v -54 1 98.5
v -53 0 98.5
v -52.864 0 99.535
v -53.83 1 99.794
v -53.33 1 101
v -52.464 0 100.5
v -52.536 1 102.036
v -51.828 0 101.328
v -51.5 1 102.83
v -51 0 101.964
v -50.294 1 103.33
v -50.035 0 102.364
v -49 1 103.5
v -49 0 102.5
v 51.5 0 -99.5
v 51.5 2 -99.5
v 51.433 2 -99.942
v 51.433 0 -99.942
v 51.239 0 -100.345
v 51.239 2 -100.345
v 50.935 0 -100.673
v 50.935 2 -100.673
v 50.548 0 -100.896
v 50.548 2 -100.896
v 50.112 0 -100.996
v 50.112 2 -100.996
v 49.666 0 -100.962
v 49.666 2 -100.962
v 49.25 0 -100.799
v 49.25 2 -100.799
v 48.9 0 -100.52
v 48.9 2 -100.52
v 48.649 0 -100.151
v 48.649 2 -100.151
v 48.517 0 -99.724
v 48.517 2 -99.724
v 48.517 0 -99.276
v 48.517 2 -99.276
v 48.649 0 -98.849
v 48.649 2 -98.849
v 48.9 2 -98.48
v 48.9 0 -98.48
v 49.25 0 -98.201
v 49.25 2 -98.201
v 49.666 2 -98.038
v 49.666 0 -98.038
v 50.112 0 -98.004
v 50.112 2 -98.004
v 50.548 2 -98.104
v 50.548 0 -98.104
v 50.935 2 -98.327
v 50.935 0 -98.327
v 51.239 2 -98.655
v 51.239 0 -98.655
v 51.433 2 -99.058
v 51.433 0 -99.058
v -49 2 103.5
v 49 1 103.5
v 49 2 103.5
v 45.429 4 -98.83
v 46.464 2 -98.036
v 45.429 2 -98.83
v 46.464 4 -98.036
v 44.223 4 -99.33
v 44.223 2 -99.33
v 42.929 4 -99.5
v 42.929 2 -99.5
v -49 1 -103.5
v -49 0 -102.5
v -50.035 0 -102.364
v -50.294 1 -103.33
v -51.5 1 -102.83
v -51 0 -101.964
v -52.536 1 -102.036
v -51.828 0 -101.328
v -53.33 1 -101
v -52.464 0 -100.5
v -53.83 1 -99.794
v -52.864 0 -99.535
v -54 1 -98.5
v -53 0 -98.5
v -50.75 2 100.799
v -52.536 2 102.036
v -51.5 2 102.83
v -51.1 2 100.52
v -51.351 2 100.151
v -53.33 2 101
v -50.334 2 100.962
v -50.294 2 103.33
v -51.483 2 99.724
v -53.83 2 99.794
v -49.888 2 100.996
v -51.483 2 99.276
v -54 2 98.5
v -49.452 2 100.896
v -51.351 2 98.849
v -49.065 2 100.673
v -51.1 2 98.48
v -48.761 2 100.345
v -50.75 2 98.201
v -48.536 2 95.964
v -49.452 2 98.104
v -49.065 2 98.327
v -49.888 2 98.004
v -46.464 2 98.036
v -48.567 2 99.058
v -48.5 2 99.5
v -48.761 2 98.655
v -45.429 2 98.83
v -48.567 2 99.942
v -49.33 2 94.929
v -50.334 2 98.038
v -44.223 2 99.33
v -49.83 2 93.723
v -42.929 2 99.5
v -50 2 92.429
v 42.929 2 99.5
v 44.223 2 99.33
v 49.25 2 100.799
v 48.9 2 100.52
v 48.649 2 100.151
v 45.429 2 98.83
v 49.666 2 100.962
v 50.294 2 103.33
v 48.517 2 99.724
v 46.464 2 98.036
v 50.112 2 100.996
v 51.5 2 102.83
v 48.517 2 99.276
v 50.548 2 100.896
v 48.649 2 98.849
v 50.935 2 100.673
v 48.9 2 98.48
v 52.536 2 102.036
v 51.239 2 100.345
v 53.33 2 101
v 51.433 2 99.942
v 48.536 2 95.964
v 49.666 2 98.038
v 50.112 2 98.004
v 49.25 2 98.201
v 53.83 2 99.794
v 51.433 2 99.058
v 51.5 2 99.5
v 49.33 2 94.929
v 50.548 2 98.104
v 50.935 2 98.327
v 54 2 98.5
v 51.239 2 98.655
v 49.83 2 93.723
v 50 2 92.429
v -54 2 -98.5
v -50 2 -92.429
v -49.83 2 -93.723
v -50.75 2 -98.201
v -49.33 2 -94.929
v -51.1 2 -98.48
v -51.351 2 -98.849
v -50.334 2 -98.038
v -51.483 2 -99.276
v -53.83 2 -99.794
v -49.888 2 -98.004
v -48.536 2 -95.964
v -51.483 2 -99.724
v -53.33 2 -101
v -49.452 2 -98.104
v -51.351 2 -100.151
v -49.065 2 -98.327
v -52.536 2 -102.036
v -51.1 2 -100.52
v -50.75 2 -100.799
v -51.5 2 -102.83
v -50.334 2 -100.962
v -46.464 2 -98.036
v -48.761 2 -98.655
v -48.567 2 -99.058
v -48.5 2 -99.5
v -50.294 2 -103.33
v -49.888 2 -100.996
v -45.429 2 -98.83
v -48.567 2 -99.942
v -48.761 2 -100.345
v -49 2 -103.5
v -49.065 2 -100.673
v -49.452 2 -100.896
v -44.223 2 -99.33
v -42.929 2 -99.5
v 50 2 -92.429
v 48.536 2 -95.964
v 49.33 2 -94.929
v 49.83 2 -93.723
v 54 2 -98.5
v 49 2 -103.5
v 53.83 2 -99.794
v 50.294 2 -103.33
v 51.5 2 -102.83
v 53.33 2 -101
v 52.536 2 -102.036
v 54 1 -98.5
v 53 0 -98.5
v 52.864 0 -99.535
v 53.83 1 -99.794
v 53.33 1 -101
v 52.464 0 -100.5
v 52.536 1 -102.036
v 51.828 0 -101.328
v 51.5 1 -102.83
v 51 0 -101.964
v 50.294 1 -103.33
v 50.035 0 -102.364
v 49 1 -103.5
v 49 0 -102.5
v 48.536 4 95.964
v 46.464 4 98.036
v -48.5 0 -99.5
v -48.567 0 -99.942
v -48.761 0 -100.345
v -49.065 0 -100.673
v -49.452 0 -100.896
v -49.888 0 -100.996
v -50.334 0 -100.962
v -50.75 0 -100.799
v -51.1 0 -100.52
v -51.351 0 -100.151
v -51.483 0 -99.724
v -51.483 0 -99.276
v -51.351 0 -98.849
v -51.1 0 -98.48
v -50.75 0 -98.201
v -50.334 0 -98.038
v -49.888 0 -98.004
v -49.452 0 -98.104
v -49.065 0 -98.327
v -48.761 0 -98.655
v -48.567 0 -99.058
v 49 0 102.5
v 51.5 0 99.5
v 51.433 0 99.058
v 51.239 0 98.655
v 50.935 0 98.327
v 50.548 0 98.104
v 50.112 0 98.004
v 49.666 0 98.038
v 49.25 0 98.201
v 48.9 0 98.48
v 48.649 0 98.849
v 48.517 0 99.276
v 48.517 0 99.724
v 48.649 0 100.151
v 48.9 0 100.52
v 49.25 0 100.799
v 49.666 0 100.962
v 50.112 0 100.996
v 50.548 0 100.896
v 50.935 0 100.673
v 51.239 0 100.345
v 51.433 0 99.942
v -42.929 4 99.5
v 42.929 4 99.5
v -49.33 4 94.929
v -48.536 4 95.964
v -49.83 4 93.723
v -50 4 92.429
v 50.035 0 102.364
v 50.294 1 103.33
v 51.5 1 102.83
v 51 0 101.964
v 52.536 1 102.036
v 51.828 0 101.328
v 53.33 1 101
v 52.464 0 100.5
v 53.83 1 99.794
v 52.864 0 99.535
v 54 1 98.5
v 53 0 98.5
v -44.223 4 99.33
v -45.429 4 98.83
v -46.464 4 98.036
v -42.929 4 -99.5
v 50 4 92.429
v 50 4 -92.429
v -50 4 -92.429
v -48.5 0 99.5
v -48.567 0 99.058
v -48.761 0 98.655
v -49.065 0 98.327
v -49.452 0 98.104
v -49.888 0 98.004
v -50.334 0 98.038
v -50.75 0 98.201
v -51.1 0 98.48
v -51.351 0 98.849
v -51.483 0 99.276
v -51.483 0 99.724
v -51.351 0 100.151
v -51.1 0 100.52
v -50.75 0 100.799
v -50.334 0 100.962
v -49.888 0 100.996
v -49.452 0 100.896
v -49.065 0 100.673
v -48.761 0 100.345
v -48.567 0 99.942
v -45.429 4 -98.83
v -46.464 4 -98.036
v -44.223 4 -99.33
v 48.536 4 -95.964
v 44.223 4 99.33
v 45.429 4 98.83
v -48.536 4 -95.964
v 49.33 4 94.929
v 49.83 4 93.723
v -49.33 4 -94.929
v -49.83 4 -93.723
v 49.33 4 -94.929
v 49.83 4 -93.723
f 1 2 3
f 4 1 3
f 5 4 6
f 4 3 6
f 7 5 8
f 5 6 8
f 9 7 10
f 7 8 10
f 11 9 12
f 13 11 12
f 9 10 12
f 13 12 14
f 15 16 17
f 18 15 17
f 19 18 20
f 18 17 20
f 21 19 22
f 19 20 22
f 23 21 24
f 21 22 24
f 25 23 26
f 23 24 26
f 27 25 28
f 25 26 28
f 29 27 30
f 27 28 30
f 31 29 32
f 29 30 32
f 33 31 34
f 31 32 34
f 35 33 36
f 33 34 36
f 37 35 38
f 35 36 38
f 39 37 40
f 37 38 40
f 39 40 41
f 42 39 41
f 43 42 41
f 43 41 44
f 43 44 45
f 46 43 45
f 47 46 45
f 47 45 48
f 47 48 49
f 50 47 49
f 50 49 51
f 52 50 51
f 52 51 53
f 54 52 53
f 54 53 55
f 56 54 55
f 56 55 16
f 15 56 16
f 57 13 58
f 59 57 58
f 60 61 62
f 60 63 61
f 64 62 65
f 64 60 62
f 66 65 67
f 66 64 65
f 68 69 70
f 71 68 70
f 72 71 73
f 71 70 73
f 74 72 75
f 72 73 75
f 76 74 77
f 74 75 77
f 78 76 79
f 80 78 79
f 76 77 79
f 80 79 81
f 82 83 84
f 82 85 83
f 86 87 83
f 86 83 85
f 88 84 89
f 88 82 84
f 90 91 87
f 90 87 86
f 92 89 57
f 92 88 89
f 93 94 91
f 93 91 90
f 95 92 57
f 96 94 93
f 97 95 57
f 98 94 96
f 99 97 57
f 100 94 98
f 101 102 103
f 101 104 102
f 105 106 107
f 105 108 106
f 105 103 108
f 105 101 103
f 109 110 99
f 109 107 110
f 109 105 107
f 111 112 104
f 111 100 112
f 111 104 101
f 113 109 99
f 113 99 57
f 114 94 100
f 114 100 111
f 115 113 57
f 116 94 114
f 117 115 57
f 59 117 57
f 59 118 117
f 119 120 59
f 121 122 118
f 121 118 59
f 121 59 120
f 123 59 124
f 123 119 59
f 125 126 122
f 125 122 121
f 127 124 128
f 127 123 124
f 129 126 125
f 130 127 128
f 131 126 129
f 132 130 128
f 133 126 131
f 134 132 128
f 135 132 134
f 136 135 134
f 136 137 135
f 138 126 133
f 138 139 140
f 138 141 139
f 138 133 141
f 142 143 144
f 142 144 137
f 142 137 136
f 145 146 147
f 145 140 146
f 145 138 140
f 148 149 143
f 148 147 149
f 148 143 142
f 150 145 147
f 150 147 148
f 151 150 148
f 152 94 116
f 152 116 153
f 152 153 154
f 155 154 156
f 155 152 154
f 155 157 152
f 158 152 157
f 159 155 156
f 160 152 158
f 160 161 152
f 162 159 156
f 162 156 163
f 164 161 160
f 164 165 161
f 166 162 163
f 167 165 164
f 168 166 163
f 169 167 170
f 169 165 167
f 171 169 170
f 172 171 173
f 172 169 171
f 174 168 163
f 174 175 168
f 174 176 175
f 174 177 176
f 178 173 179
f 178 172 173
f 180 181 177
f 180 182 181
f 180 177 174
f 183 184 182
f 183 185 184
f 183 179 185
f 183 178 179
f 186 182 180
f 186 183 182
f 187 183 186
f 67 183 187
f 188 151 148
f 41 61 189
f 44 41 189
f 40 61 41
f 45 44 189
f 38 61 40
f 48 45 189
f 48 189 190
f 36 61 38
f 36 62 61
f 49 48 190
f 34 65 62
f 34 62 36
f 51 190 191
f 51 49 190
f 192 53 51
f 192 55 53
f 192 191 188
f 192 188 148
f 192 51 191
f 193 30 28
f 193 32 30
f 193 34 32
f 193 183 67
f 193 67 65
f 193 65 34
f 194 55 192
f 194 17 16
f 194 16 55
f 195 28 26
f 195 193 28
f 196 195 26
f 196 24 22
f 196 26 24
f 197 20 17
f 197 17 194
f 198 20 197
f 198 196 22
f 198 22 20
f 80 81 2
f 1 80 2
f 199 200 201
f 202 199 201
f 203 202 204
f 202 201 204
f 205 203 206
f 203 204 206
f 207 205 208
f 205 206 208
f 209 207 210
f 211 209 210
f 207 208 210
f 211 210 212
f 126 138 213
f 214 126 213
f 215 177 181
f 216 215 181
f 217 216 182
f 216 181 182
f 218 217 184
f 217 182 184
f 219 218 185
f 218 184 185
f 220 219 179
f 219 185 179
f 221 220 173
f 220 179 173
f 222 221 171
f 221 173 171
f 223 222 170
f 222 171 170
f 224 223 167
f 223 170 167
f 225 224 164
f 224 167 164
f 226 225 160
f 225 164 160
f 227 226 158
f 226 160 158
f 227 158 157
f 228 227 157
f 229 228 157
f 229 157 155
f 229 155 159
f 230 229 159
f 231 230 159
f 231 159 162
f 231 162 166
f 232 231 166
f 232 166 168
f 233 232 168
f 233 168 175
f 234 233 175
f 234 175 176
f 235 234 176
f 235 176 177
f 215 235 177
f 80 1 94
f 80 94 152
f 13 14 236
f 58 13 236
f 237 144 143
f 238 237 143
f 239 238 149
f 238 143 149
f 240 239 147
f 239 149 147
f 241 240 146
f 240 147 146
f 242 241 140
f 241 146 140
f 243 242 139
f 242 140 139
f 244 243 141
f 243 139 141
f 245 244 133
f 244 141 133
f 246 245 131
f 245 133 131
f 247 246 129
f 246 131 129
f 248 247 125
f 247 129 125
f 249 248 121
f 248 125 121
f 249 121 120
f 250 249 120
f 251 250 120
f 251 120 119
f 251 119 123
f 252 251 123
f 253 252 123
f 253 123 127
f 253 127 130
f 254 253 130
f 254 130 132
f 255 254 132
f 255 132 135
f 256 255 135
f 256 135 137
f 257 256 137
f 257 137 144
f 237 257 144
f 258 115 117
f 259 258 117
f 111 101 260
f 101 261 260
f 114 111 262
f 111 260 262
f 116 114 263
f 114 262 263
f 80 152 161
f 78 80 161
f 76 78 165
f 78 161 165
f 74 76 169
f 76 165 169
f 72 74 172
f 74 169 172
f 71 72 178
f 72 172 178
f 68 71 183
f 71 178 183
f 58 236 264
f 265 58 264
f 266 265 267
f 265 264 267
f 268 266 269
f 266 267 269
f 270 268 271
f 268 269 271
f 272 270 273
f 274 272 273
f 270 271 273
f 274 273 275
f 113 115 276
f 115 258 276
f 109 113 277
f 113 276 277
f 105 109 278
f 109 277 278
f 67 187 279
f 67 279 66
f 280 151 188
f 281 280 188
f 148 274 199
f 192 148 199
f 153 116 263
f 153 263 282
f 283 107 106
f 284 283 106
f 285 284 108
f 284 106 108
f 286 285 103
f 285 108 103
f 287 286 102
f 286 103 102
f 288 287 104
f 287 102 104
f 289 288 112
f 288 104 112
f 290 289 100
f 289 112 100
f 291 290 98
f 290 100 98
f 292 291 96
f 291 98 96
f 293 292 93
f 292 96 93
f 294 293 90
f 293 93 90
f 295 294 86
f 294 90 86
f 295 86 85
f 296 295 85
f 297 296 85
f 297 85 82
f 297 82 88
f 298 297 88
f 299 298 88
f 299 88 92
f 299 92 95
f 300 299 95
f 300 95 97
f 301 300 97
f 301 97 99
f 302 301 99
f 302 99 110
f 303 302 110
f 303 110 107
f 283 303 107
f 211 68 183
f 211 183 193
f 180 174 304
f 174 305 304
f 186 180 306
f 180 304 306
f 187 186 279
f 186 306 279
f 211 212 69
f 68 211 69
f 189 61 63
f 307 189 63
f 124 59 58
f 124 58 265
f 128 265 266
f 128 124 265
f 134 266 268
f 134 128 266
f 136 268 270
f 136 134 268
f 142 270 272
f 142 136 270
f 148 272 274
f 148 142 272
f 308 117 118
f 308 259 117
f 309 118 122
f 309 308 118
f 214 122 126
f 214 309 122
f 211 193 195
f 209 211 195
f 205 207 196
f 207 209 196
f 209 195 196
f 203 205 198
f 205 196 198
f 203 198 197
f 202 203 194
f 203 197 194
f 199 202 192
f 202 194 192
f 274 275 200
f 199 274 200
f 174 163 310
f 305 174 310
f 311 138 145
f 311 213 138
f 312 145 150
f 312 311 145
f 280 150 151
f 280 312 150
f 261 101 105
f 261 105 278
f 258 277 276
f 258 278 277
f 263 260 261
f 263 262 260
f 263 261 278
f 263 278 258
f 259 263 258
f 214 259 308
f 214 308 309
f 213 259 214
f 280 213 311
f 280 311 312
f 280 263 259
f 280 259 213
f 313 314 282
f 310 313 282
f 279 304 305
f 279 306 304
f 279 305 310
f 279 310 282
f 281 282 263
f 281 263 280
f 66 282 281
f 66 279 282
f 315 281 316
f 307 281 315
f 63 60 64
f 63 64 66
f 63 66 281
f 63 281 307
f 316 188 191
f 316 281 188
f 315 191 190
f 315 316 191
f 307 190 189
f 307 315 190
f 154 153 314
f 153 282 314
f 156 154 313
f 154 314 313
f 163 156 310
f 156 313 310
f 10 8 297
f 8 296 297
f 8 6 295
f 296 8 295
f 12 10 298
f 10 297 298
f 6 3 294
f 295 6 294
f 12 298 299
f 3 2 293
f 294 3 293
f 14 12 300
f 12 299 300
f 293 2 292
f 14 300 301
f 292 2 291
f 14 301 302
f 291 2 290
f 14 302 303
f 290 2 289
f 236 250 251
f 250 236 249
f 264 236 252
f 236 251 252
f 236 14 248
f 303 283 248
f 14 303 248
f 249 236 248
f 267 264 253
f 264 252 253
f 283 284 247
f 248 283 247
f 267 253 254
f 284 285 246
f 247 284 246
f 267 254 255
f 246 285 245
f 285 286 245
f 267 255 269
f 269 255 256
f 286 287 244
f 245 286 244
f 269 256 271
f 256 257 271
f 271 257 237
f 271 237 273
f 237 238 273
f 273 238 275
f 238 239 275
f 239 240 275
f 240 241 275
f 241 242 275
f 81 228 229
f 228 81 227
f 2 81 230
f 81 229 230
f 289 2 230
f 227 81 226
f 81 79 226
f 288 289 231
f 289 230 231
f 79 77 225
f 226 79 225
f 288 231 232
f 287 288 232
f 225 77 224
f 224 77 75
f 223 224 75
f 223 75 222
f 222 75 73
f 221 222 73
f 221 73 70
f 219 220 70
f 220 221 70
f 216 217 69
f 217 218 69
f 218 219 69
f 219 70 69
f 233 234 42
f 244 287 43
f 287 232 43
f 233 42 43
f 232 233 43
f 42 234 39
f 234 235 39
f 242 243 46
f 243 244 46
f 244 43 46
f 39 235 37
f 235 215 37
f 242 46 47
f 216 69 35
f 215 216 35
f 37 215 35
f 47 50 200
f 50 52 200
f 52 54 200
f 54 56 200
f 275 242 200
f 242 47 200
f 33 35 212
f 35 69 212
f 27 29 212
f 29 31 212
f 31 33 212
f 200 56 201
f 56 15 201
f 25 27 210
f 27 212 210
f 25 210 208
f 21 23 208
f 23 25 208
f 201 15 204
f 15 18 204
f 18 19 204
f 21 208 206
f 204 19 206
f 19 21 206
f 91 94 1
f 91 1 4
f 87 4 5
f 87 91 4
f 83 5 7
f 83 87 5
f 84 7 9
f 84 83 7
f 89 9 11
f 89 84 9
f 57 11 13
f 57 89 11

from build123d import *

# Parameters (mm, degrees)
SKETCH1_W                 = 108
SKETCH1_H                 = 207
BOSS_EXTRUDE1_DEPTH       = 2
SKETCH2_W                 = 100
SKETCH2_H                 = 199
BOSS_EXTRUDE2_DEPTH       = 2
CHAMFER1_SIZE             = 5
FILLET1_R                 = 5
F_3_0MM_DOWEL_HOLE1_D     = 3
F_3_0MM_DOWEL_HOLE1_DEPTH = 17.29
F_3_0MM_DOWEL_HOLE1_TIP   = 0.901290929
CHAMFER2_SIZE             = 1


with BuildPart() as part:
    # Sketch1 → Boss-Extrude1 (new body)
    with BuildSketch(Plane(origin=(0, 0, 0), x_dir=(1, 0, 0), z_dir=(0, 1, 0))):
        Rectangle(SKETCH1_W, SKETCH1_H)
    extrude(amount=BOSS_EXTRUDE1_DEPTH)

    # Sketch2 → Boss-Extrude2 (add)
    with BuildSketch(Plane(origin=(0, 2, 0), x_dir=(1, 0, 0), z_dir=(0, 1, 0))):
        Rectangle(SKETCH2_W, SKETCH2_H)
    extrude(amount=BOSS_EXTRUDE2_DEPTH)

    # Chamfer1
    chamfer1_edges = [part.edges().sort_by_distance(p)[0] for p in [
        (50, 3, 99.5),
        (50, 3, -99.5),
        (-50, 3, -99.5),
        (-50, 3, 99.5),
    ]]
    chamfer(chamfer1_edges, length=CHAMFER1_SIZE)

    # Fillet1
    fillet1_edges = [part.edges().sort_by_distance(p)[0] for p in [
        (-50, 3, 94.5),
        (-50, 3, -94.5),
        (45, 3, -99.5),
        (-45, 3, -99.5),
        (50, 3, 94.5),
        (50, 3, -94.5),
        (45, 3, 99.5),
        (-45, 3, 99.5),
        (54, 1, 103.5),
        (-54, 1, 103.5),
        (-54, 1, -103.5),
        (54, 1, -103.5),
    ]]
    fillet(fillet1_edges, radius=FILLET1_R)

    # Ø3.0mm Dowel Hole1
    with Locations(Plane(origin=(0, 0, 0), x_dir=(-1, 0, 0), z_dir=(0, -1, 0))):
        with Locations((-50, 99.5), (50, 99.5), (50, -99.5), (-50, -99.5)):
            Hole(F_3_0MM_DOWEL_HOLE1_D / 2, depth=F_3_0MM_DOWEL_HOLE1_DEPTH)
            with Locations((0, 0, -(F_3_0MM_DOWEL_HOLE1_DEPTH + F_3_0MM_DOWEL_HOLE1_TIP / 2))):  # 118° drill point
                Cone(0, F_3_0MM_DOWEL_HOLE1_D / 2, F_3_0MM_DOWEL_HOLE1_TIP, mode=Mode.SUBTRACT)

    # Chamfer2
    chamfer2_edges = [part.edges().sort_by_distance(p)[0] for p in [
        (0, 0, 103.5),
        (54, 0, 0),
        (-54, 0, 0),
        (0, 0, -103.5),
        (-52.535533906, 0, -102.035533906),
        (52.535533906, 0, -102.035533906),
        (52.535533906, 0, 102.035533906),
        (-52.535533906, 0, 102.035533906),
    ]]
    chamfer(chamfer2_edges, length=CHAMFER2_SIZE)


solid = part.part
